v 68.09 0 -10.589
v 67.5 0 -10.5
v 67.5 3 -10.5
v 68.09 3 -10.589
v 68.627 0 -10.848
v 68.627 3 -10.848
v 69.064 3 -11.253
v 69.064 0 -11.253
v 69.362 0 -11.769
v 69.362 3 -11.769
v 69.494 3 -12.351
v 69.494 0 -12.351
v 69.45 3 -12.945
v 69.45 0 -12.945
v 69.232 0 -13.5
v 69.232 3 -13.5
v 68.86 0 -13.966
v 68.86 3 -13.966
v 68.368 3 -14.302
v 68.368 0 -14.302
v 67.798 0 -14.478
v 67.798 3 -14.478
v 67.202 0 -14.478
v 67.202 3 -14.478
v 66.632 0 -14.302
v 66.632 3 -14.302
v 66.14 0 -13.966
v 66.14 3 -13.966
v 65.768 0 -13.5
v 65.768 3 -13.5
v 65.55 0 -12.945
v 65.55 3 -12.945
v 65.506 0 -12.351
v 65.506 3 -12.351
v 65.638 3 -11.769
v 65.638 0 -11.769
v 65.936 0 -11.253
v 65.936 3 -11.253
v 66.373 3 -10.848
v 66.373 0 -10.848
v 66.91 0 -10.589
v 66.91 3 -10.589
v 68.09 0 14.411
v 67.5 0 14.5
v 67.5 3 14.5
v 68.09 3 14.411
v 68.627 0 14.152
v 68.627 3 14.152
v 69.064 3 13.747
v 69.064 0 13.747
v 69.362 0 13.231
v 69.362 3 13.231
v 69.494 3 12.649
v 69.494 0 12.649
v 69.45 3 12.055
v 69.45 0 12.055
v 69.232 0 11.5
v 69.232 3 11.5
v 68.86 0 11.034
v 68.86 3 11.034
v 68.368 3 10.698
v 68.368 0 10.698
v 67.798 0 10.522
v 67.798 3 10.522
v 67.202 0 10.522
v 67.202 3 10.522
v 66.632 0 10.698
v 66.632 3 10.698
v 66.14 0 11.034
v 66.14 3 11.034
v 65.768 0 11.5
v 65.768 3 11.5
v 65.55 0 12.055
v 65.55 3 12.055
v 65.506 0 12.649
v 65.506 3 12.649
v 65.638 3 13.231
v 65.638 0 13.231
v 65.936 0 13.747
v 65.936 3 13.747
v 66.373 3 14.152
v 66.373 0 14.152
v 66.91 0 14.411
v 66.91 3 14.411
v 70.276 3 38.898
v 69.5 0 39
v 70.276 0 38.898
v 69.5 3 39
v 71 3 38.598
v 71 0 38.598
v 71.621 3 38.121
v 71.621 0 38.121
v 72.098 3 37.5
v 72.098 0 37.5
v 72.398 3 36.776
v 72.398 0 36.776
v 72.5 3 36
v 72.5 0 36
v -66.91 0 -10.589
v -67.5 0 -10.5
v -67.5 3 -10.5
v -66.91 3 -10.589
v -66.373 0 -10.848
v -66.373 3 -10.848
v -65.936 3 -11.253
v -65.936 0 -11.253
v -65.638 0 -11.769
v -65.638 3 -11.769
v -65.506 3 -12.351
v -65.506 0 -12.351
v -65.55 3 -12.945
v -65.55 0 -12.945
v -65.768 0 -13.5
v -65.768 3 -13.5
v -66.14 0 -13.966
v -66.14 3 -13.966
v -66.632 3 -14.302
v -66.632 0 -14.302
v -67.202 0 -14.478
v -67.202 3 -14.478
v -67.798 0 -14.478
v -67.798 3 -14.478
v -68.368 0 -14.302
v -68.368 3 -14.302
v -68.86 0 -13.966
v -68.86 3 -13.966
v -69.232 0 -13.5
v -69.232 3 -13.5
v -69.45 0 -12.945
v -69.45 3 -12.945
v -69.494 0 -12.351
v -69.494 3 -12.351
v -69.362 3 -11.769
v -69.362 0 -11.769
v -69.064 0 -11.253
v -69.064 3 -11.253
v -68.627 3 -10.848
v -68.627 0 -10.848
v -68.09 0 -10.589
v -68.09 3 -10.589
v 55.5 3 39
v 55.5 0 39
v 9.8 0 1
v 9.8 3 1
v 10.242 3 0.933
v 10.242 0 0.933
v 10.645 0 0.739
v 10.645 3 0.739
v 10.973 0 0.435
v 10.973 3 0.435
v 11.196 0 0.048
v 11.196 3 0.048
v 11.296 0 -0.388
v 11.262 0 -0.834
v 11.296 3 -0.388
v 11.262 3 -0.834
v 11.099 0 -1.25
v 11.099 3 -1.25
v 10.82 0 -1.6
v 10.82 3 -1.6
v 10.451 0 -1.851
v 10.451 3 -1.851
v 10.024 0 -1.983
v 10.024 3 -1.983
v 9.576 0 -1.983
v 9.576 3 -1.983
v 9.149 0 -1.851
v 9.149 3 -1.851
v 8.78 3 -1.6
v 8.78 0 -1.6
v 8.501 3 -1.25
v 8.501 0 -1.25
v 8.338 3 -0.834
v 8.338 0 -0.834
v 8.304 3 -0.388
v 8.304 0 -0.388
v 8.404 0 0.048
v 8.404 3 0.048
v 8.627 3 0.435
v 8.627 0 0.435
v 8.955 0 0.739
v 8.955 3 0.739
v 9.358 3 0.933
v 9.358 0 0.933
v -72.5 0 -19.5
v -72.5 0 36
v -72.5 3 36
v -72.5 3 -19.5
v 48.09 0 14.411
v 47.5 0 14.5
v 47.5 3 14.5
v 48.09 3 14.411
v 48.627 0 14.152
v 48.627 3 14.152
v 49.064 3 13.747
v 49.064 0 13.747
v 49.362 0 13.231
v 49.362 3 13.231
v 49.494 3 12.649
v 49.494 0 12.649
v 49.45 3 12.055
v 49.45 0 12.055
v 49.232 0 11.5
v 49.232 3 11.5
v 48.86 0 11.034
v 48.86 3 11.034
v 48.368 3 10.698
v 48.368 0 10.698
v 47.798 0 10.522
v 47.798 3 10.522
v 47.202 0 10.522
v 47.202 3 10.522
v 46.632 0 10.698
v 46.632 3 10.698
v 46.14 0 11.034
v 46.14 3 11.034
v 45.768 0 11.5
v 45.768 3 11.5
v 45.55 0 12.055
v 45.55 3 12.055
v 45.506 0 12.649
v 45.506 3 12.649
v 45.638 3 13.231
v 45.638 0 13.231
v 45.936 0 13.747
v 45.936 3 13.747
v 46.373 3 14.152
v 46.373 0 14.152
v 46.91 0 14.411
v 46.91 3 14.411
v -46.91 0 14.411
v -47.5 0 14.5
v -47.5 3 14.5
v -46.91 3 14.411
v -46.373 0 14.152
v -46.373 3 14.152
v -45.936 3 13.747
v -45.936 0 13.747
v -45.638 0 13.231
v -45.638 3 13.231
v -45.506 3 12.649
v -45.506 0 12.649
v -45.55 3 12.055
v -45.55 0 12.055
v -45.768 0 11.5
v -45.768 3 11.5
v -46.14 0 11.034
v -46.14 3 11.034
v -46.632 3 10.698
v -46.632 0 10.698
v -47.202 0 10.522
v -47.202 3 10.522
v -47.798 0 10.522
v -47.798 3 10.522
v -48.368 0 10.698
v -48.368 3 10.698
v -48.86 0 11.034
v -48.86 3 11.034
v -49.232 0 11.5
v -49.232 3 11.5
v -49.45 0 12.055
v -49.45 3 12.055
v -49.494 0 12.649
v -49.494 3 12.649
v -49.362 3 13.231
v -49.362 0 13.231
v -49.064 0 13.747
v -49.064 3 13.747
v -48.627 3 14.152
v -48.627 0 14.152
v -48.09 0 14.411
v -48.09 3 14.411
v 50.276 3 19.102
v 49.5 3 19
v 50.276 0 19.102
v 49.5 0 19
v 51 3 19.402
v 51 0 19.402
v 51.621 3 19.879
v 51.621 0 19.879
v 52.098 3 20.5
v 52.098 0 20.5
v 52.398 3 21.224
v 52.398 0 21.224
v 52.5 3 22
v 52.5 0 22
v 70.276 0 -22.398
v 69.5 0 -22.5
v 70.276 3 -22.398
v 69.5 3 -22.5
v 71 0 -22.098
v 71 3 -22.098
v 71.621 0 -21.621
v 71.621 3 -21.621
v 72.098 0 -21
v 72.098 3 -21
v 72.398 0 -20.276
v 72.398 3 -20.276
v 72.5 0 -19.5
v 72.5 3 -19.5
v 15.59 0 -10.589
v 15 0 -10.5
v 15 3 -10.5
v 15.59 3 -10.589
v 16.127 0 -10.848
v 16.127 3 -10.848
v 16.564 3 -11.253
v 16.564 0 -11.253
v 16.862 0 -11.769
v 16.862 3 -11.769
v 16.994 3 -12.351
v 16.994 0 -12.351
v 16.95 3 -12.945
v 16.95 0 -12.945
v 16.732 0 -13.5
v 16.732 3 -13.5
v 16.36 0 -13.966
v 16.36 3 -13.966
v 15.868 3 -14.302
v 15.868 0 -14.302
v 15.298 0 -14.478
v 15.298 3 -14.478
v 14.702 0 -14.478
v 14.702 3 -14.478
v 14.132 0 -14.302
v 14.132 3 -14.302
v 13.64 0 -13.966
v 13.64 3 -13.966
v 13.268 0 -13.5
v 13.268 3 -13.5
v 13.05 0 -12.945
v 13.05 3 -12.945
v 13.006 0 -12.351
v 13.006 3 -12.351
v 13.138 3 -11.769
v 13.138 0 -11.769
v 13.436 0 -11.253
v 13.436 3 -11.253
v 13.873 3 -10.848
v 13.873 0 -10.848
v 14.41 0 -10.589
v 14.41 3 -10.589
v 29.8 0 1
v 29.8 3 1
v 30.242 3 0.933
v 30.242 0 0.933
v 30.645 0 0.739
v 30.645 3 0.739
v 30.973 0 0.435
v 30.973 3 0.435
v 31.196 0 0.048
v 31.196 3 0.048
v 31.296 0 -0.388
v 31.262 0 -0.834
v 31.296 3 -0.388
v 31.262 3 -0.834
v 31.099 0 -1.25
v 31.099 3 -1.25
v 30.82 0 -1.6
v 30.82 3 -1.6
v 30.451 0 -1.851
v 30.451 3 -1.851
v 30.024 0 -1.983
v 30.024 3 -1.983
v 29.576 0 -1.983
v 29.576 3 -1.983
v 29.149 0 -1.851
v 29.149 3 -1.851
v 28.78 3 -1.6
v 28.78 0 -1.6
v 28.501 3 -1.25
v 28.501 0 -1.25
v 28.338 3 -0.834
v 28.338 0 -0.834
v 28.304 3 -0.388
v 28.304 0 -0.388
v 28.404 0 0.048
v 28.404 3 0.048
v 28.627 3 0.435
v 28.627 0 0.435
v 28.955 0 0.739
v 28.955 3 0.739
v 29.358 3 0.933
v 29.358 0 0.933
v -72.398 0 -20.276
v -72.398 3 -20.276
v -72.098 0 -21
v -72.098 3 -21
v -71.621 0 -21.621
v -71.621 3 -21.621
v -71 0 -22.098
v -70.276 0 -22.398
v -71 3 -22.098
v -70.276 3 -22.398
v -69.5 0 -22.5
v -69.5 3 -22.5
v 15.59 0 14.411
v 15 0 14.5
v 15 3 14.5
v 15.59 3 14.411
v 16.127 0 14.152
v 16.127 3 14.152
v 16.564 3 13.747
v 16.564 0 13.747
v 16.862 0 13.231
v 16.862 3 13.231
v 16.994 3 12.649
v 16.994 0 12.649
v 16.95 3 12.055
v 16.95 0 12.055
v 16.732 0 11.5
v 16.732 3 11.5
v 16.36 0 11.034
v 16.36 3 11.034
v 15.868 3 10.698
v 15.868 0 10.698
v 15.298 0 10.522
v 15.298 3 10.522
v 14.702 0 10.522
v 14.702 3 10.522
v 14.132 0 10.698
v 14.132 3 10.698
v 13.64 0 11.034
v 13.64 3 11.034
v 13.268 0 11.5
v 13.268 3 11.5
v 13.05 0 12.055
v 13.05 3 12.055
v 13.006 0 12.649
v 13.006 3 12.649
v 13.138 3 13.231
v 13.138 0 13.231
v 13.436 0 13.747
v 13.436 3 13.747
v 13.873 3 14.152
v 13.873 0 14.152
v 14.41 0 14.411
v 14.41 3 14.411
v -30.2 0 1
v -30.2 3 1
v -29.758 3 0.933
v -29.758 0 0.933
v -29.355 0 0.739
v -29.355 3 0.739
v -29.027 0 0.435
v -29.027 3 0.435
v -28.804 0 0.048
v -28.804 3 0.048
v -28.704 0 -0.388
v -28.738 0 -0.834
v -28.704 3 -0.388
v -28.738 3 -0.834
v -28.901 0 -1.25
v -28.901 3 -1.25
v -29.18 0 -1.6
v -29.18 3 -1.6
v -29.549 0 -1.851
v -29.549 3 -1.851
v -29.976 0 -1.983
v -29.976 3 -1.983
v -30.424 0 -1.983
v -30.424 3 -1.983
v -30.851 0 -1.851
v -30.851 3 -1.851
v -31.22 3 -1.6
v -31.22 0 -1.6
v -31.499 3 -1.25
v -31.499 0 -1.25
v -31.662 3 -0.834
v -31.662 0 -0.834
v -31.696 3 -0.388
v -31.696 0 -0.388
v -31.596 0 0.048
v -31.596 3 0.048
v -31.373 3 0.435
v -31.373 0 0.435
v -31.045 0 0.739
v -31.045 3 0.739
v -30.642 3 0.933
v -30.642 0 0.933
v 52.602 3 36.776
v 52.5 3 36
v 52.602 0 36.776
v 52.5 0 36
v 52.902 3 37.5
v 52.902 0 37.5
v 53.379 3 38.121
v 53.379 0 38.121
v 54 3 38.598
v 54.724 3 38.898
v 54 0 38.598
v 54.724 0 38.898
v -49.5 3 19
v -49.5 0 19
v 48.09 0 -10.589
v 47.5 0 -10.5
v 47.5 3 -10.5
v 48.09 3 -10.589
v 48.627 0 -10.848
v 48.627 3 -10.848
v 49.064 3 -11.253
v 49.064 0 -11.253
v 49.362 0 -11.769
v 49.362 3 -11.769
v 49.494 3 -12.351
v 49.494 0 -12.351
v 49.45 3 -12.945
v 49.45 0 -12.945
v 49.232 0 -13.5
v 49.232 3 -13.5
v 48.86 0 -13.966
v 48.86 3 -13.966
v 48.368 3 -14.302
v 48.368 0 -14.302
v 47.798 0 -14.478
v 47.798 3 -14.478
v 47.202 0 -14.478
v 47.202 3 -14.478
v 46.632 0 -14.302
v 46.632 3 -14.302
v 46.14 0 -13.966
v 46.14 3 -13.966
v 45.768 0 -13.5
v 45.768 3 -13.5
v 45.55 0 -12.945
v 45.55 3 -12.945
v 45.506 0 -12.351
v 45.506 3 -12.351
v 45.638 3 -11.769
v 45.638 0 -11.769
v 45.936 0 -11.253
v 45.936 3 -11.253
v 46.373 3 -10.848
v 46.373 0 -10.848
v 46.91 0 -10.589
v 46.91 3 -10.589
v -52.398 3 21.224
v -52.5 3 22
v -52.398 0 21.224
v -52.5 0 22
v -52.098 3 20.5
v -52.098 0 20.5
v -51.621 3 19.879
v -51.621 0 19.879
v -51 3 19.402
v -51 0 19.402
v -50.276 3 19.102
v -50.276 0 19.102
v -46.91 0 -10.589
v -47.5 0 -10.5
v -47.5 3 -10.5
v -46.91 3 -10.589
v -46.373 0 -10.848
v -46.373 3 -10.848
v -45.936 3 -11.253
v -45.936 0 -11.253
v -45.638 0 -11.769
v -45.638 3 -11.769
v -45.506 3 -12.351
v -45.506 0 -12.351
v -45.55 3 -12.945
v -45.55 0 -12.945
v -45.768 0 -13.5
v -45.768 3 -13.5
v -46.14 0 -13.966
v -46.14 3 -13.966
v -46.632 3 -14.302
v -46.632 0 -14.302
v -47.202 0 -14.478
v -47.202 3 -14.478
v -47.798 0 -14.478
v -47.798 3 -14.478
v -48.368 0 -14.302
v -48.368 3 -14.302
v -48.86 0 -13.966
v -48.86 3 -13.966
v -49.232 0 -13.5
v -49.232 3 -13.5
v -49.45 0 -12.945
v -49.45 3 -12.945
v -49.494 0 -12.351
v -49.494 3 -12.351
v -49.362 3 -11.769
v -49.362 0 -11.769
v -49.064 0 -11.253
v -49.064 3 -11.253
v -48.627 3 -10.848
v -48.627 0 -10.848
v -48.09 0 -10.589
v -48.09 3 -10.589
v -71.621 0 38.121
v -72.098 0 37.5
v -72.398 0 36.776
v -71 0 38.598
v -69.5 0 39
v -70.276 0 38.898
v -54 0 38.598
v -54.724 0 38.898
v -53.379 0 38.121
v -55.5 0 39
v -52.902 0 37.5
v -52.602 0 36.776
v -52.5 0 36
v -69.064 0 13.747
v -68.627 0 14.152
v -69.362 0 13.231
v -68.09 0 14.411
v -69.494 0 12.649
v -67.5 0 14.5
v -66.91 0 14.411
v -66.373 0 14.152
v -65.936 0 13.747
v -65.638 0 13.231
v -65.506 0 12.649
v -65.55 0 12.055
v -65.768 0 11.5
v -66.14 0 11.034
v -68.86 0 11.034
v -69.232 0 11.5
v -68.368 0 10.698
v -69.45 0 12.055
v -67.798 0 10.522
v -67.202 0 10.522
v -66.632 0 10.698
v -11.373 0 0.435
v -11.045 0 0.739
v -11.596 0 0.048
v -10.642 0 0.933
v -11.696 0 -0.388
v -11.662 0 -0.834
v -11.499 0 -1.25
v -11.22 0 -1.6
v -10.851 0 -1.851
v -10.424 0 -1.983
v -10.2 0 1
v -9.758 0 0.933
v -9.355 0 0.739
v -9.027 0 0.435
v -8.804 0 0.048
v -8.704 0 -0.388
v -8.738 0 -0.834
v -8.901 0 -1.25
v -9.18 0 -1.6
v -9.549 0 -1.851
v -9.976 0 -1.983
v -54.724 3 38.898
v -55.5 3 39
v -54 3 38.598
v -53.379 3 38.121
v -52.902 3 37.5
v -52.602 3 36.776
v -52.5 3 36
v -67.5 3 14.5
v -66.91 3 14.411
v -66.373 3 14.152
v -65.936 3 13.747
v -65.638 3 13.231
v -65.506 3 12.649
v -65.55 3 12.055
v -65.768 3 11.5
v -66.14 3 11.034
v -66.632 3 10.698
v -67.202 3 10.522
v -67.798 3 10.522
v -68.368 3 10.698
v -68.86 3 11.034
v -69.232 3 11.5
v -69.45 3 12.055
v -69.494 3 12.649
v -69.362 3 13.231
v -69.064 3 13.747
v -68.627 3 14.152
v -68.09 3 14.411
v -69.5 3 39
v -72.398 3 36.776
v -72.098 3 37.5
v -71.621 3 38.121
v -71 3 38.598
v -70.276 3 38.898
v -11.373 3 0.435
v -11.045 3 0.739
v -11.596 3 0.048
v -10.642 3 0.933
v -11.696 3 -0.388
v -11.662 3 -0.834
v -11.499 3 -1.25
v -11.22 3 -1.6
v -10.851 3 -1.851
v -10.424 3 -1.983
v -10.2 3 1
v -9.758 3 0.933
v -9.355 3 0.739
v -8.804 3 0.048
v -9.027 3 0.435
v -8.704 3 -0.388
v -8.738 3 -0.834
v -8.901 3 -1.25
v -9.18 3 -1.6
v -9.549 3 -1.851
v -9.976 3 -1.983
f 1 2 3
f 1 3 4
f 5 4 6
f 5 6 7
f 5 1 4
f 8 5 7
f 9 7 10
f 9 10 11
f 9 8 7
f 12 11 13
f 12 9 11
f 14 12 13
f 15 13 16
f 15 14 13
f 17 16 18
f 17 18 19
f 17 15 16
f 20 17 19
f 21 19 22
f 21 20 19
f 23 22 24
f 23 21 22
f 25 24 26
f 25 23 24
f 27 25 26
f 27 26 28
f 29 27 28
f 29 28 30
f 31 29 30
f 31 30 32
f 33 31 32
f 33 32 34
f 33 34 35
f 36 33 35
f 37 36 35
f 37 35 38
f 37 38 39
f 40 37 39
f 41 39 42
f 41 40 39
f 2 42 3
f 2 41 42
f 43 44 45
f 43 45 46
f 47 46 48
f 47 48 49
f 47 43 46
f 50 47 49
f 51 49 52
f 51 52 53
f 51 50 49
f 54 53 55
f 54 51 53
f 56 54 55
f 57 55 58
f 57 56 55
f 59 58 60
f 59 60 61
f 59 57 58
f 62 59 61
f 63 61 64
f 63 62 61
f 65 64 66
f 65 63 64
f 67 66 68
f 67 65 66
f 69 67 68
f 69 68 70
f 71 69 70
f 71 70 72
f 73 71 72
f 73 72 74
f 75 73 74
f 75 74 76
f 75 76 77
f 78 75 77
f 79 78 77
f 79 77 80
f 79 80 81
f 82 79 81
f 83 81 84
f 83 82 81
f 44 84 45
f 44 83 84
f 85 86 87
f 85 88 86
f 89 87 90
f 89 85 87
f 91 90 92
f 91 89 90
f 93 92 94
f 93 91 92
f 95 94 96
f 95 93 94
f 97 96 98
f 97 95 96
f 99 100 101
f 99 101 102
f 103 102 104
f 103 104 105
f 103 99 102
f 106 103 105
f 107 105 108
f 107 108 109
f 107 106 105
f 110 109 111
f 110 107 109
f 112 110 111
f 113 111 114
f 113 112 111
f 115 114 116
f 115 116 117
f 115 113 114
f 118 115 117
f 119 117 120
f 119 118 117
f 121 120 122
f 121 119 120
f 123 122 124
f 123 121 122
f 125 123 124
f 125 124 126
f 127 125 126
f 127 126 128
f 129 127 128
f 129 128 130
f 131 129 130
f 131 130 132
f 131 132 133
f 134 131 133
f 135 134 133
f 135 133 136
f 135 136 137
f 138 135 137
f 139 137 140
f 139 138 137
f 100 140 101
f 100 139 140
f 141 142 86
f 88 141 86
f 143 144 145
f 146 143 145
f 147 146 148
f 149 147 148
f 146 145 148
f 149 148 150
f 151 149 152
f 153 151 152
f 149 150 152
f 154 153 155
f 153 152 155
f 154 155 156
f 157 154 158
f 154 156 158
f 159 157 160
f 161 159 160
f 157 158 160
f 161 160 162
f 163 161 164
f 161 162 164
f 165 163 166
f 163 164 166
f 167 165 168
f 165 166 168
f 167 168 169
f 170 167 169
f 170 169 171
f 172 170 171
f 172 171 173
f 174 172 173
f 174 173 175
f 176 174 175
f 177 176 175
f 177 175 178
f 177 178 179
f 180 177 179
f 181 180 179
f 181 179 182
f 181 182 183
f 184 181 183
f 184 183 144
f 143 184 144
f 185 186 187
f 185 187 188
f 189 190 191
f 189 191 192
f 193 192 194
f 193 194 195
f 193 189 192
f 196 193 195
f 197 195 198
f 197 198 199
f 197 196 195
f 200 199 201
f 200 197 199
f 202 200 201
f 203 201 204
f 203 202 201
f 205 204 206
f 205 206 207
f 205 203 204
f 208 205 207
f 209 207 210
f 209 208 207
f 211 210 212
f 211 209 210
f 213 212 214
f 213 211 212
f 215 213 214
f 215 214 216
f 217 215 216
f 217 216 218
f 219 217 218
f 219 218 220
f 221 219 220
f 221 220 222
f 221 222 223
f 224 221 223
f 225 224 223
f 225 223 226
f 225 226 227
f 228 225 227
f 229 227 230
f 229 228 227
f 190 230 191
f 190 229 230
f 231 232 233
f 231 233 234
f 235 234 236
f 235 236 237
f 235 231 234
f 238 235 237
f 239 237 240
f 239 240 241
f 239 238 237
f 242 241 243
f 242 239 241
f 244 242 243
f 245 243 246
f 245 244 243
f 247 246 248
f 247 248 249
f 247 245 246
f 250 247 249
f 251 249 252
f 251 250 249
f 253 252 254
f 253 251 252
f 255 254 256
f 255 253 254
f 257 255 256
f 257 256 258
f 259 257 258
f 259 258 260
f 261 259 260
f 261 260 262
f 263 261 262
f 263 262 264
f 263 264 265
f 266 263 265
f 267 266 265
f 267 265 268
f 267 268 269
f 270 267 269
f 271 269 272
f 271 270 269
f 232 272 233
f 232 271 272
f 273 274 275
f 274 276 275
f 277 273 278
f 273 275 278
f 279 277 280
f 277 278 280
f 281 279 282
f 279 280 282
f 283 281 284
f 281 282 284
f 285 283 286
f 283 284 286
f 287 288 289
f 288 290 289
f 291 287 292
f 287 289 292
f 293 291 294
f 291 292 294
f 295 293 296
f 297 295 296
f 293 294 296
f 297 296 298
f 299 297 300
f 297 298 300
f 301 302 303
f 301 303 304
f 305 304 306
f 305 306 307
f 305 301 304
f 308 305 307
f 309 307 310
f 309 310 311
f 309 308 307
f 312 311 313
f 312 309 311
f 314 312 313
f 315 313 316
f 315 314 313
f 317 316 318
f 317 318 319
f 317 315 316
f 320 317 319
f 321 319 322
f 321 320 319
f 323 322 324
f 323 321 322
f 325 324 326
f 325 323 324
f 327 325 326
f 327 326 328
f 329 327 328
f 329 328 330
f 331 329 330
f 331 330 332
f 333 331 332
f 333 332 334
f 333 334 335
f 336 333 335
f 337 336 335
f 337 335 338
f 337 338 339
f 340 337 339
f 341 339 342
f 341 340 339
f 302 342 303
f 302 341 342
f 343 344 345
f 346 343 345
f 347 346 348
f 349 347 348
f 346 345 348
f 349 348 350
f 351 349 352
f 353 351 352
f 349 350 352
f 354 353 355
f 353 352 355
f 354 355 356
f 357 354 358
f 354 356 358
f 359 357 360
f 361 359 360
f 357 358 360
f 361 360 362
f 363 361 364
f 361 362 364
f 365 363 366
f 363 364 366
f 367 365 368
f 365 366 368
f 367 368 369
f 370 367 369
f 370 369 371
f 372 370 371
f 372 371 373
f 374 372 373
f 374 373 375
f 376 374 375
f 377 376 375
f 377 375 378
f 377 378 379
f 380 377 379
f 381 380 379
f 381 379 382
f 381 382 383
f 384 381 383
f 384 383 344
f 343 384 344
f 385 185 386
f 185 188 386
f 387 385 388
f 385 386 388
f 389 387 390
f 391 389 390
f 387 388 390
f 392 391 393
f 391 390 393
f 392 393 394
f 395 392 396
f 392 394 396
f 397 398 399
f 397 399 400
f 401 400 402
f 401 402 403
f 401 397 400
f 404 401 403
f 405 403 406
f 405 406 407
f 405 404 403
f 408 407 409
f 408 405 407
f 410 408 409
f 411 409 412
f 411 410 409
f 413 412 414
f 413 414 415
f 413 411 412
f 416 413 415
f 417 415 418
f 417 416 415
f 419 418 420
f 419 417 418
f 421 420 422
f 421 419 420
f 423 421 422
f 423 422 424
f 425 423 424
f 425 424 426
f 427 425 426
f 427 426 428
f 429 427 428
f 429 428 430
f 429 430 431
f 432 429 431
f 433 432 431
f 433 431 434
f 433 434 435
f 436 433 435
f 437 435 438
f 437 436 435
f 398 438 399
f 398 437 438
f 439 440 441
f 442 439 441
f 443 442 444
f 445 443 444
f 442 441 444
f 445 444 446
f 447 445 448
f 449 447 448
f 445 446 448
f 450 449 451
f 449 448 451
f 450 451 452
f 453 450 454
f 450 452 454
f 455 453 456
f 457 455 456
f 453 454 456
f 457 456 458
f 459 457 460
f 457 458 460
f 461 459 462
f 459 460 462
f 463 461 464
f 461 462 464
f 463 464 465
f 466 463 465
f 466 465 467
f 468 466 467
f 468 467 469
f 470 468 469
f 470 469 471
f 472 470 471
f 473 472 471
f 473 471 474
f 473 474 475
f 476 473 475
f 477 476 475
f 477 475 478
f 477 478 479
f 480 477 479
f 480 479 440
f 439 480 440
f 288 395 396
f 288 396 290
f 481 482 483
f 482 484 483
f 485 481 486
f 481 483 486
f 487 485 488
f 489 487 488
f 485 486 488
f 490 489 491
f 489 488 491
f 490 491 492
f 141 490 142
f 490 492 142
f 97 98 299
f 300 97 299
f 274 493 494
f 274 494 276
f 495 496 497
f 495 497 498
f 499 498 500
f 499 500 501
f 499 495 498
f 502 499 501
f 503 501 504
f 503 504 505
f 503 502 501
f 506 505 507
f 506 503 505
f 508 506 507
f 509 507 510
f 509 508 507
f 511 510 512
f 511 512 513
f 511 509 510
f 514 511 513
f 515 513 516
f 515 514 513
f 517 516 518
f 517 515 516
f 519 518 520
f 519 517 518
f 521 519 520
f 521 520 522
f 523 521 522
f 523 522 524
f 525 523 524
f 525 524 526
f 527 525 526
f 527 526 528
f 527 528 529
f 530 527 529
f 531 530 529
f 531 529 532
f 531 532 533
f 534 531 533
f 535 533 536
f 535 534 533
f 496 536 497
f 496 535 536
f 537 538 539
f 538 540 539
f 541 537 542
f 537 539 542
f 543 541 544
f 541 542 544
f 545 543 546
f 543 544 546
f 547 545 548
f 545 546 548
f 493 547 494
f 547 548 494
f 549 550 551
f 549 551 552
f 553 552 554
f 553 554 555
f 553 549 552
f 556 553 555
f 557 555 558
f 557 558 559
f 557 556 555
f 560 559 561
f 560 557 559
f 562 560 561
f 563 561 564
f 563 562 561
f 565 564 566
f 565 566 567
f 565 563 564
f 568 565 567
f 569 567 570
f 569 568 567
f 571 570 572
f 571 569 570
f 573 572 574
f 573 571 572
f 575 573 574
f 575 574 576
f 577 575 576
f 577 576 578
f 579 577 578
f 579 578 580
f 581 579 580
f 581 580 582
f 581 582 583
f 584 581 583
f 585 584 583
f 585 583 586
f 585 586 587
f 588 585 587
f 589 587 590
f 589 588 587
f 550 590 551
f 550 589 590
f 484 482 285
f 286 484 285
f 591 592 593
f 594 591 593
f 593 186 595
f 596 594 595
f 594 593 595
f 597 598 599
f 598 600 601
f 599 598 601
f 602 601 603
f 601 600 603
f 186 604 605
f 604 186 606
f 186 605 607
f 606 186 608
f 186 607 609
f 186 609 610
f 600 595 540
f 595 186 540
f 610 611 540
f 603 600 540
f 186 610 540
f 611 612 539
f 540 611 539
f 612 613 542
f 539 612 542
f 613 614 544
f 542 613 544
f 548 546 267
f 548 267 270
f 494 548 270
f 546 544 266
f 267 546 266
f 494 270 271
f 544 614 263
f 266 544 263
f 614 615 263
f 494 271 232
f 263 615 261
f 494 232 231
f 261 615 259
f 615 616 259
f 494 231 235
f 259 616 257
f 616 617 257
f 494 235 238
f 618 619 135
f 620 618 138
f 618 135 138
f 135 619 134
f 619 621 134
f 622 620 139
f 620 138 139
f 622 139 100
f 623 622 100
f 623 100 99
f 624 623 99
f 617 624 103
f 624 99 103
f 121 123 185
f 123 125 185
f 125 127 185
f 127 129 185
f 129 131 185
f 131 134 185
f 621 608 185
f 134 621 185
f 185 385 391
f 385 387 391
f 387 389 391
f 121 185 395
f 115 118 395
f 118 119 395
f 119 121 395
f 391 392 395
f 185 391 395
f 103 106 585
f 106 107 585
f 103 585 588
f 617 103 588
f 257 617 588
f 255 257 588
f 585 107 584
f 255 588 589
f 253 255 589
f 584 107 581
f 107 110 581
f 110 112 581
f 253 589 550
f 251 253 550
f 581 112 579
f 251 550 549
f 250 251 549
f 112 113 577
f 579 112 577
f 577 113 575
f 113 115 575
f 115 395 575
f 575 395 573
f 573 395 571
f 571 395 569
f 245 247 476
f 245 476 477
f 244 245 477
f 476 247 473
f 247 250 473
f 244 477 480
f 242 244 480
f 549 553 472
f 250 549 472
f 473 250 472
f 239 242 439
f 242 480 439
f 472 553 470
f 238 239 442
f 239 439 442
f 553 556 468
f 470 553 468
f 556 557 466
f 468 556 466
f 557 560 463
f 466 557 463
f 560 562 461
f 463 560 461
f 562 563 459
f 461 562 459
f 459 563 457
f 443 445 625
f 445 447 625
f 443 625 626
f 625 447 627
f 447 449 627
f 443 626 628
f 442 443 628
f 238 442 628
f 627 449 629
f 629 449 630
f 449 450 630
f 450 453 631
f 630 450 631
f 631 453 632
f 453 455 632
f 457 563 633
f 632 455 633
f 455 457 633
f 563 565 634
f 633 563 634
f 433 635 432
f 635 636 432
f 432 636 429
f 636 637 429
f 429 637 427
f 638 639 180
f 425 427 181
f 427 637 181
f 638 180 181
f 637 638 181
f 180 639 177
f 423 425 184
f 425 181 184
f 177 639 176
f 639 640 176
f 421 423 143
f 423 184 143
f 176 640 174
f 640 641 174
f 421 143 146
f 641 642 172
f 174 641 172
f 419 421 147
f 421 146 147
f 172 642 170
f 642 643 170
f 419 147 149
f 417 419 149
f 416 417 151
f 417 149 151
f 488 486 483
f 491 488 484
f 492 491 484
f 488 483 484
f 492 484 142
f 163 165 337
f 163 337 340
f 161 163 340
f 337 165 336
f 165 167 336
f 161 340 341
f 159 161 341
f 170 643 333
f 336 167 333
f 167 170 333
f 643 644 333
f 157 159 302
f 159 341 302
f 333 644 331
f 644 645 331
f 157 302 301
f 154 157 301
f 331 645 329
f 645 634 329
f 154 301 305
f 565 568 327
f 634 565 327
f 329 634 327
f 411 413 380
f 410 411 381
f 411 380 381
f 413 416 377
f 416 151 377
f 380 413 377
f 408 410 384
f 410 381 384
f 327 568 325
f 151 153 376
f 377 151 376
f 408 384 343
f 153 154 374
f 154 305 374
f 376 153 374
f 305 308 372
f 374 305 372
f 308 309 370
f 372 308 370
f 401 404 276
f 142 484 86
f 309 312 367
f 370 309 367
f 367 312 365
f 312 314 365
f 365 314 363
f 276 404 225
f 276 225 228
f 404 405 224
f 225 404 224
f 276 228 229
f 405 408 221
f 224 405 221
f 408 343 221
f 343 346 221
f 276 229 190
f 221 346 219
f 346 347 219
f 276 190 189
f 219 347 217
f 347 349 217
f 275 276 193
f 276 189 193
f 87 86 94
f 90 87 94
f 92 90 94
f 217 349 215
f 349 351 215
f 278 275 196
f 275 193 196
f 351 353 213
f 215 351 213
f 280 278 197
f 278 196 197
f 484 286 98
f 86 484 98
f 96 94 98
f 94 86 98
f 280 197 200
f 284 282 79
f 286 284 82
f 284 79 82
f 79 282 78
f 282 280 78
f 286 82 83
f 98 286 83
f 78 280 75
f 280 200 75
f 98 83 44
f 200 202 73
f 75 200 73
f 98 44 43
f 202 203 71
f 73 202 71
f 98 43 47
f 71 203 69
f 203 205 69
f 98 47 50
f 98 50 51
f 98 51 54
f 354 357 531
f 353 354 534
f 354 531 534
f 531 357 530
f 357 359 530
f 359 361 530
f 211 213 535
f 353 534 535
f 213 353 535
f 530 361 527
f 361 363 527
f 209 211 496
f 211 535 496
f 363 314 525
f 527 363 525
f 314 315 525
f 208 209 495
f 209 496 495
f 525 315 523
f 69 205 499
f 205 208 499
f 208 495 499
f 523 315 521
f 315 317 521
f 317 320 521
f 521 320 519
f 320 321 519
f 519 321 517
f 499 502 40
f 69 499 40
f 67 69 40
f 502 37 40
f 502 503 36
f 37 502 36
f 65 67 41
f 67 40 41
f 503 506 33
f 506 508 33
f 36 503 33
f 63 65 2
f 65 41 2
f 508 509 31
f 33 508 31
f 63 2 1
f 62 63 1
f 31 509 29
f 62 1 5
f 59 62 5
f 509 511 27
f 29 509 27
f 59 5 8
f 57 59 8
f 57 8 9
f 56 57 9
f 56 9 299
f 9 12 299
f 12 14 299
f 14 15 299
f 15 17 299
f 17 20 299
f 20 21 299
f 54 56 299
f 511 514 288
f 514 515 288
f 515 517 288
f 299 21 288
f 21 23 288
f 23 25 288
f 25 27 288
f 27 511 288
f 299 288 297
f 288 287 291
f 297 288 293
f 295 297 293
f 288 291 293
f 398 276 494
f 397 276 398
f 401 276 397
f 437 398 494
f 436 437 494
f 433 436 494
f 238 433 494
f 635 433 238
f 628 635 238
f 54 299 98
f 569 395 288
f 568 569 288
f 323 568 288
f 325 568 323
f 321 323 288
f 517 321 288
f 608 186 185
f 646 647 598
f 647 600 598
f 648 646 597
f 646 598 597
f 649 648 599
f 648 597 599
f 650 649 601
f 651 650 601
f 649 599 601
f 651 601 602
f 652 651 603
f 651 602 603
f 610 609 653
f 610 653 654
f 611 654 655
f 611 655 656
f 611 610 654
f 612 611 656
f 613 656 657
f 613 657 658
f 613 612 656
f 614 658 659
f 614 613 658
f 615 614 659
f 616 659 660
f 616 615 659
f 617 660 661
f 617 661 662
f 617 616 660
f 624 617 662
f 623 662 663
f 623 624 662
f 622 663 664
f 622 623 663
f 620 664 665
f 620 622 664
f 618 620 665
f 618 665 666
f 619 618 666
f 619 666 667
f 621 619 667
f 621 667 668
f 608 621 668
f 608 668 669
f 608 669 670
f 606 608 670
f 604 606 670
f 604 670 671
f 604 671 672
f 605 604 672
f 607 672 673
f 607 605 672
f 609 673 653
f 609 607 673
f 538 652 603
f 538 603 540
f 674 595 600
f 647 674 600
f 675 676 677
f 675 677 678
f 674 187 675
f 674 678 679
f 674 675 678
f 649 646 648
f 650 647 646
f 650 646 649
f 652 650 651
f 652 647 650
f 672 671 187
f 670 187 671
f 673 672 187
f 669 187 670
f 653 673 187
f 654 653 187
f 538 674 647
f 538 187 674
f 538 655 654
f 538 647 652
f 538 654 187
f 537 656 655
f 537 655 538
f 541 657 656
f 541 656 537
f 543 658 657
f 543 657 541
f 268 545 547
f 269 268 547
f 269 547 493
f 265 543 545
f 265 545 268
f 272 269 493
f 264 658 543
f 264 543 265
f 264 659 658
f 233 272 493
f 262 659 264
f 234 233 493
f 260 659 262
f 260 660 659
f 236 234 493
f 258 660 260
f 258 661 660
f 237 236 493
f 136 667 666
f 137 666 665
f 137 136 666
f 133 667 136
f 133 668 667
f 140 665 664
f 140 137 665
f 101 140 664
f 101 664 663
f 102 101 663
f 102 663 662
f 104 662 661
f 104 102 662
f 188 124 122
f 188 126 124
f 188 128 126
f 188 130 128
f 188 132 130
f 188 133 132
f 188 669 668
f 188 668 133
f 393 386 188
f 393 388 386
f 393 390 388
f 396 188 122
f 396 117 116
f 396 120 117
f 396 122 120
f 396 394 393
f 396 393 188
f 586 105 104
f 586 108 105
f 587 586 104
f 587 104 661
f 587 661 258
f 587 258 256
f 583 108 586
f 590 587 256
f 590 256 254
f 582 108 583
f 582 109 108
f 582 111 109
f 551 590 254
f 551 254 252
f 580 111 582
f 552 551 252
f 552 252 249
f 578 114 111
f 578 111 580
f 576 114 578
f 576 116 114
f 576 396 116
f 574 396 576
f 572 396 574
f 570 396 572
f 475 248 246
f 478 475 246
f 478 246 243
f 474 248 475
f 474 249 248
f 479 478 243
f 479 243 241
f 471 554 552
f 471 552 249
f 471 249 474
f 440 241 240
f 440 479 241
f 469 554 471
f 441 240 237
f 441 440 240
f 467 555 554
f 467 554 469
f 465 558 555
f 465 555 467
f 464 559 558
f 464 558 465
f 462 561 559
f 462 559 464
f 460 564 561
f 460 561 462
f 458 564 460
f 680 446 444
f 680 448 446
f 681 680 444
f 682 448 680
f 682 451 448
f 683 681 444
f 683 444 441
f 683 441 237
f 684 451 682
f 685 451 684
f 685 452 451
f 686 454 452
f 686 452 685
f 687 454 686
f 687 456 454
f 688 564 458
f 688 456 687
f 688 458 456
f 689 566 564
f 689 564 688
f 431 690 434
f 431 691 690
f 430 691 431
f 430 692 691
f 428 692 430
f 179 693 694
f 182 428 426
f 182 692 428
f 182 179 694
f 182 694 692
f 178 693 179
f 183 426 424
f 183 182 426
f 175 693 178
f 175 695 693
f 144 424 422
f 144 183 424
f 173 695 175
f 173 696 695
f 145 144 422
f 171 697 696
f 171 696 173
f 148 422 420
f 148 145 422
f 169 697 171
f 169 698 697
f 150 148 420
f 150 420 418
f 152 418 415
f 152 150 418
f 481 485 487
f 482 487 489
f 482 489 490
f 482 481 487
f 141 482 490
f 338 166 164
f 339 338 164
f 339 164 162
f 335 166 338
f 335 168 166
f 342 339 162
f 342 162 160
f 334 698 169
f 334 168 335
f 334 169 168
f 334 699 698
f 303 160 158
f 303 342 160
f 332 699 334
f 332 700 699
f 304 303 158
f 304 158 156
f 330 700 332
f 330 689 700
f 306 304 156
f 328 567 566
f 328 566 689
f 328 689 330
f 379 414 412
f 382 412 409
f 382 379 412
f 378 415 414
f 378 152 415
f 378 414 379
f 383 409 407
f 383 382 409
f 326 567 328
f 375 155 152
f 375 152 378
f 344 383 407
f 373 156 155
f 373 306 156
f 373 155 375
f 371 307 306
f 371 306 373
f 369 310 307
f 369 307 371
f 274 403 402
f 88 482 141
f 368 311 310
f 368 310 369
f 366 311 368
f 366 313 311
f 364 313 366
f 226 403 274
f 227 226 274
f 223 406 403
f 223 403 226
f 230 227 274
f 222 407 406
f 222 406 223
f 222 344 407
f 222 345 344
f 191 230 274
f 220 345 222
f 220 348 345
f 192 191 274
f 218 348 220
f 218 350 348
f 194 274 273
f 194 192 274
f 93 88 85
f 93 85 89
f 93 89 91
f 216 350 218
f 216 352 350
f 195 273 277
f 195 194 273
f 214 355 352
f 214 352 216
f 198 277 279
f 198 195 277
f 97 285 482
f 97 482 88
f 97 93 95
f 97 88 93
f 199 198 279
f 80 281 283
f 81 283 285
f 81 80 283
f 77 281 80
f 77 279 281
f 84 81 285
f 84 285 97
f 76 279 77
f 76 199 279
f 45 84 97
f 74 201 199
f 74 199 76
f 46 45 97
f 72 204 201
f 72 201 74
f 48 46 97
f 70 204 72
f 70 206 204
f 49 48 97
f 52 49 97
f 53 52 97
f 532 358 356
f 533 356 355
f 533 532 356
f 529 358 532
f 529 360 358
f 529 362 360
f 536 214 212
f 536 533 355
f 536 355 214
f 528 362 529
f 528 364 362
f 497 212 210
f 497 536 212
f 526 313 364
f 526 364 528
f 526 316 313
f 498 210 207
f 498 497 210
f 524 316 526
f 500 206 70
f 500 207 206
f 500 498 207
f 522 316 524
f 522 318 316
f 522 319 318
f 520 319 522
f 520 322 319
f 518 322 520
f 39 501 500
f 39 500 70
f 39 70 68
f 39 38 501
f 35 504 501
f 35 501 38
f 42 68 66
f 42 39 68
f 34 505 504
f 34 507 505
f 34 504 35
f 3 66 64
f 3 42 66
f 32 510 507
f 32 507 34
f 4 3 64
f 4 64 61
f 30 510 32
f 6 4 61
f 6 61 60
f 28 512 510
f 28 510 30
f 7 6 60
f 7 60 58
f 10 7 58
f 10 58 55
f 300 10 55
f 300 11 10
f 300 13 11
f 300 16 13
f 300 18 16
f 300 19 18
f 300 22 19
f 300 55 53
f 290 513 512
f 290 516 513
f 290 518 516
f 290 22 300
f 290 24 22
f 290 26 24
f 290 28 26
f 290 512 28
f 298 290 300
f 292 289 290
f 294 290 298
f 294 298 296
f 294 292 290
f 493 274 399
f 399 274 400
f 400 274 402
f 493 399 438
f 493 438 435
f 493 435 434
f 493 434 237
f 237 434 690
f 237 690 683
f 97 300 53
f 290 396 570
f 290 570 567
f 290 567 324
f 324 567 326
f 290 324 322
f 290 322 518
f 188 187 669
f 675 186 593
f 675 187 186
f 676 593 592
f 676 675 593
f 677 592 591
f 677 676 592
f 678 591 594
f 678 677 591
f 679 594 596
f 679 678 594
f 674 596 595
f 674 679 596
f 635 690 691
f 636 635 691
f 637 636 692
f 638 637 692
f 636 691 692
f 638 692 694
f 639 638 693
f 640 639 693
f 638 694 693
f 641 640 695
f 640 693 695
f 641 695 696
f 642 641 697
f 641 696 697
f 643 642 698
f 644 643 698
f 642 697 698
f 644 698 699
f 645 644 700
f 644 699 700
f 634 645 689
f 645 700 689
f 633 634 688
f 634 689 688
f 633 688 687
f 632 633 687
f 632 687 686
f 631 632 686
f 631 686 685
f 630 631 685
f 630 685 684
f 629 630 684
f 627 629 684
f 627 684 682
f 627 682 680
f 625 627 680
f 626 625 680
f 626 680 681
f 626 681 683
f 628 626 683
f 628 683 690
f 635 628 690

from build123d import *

# Parameters (mm, degrees)
SKETCH_1_W          = 145
SKETCH_1_H          = 61.5
SKETCH_1_R          = 2
EXTRUDE_1_DEPTH     = 3
FILLET_1_R          = 3
SKETCH_4_W          = 105
SKETCH_4_H          = 20
CUT_EXTRUDE_3_DEPTH = 6
SKETCH_6_R          = 1.5
CUT_EXTRUDE_6_DEPTH = 83.378698703
FILLET_3_R          = 3


with BuildPart() as part:
    # 草图1 → 凸台-拉伸1 (new body)
    with BuildSketch(Plane(origin=(0, 0, 0), x_dir=(1, 0, 0), z_dir=(0, 1, 0))):
        with Locations((0, -8.25)):
            Rectangle(SKETCH_1_W, SKETCH_1_H)
        with Locations(Location((-67.5, 12.5, 0), (0, 0, 270))):
            Circle(SKETCH_1_R, mode=Mode.SUBTRACT)
        with Locations(Location((-67.5, -12.5, 0), (0, 0, 270))):
            Circle(SKETCH_1_R, mode=Mode.SUBTRACT)
        with Locations(Location((67.5, 12.5, 0), (0, 0, 270))):
            Circle(SKETCH_1_R, mode=Mode.SUBTRACT)
        with Locations(Location((67.5, -12.5, 0), (0, 0, 270))):
            Circle(SKETCH_1_R, mode=Mode.SUBTRACT)
        with Locations(Location((15, 12.5, 0), (0, 0, 270))):
            Circle(SKETCH_1_R, mode=Mode.SUBTRACT)
        with Locations(Location((15, -12.5, 0), (0, 0, 270))):
            Circle(SKETCH_1_R, mode=Mode.SUBTRACT)
        with Locations(Location((-47.5, 12.5, 0), (0, 0, 270))):
            Circle(SKETCH_1_R, mode=Mode.SUBTRACT)
        with Locations(Location((-47.5, -12.5, 0), (0, 0, 270))):
            Circle(SKETCH_1_R, mode=Mode.SUBTRACT)
        with Locations(Location((47.5, 12.5, 0), (0, 0, 270))):
            Circle(SKETCH_1_R, mode=Mode.SUBTRACT)
        with Locations(Location((47.5, -12.5, 0), (0, 0, 270))):
            Circle(SKETCH_1_R, mode=Mode.SUBTRACT)
    extrude(amount=EXTRUDE_1_DEPTH)

    # 圆角1
    fillet_1_edges = [part.edges().sort_by_distance(p)[0] for p in [
        (72.5, 1.5, -22.5),
        (72.5, 1.5, 39),
        (-72.5, 1.5, 39),
        (-72.5, 1.5, -22.5),
    ]]
    fillet(fillet_1_edges, radius=FILLET_1_R)

    # 草图4 → 切除-拉伸3 (cut)
    with BuildSketch(Plane(origin=(0, 3, 0), x_dir=(1, 0, 0), z_dir=(0, 1, 0))):
        with Locations((0, -29)):
            Rectangle(SKETCH_4_W, SKETCH_4_H)
    extrude(amount=-CUT_EXTRUDE_3_DEPTH, mode=Mode.SUBTRACT)

    # 草图6 → 切除-拉伸6 (cut, through all)
    with BuildSketch(Plane(origin=(0, 3, 0), x_dir=(1, 0, 0), z_dir=(0, 1, 0))):
        with Locations(Location((-30.2, 0.5, 0), (0, 0, 270))):
            Circle(SKETCH_6_R)
        with Locations(Location((-10.2, 0.5, 0), (0, 0, 270))):
            Circle(SKETCH_6_R)
        with Locations(Location((9.8, 0.5, 0), (0, 0, 270))):
            Circle(SKETCH_6_R)
        with Locations(Location((29.8, 0.5, 0), (0, 0, 270))):
            Circle(SKETCH_6_R)
    extrude(amount=-CUT_EXTRUDE_6_DEPTH, mode=Mode.SUBTRACT)

    # 圆角3
    fillet_3_edges = [part.edges().sort_by_distance(p)[0] for p in [
        (52.5, 1.5, 39),
        (-52.5, 1.5, 39),
        (-52.5, 1.5, 19),
        (52.5, 1.5, 19),
    ]]
    fillet(fillet_3_edges, radius=FILLET_3_R)


solid = part.part
